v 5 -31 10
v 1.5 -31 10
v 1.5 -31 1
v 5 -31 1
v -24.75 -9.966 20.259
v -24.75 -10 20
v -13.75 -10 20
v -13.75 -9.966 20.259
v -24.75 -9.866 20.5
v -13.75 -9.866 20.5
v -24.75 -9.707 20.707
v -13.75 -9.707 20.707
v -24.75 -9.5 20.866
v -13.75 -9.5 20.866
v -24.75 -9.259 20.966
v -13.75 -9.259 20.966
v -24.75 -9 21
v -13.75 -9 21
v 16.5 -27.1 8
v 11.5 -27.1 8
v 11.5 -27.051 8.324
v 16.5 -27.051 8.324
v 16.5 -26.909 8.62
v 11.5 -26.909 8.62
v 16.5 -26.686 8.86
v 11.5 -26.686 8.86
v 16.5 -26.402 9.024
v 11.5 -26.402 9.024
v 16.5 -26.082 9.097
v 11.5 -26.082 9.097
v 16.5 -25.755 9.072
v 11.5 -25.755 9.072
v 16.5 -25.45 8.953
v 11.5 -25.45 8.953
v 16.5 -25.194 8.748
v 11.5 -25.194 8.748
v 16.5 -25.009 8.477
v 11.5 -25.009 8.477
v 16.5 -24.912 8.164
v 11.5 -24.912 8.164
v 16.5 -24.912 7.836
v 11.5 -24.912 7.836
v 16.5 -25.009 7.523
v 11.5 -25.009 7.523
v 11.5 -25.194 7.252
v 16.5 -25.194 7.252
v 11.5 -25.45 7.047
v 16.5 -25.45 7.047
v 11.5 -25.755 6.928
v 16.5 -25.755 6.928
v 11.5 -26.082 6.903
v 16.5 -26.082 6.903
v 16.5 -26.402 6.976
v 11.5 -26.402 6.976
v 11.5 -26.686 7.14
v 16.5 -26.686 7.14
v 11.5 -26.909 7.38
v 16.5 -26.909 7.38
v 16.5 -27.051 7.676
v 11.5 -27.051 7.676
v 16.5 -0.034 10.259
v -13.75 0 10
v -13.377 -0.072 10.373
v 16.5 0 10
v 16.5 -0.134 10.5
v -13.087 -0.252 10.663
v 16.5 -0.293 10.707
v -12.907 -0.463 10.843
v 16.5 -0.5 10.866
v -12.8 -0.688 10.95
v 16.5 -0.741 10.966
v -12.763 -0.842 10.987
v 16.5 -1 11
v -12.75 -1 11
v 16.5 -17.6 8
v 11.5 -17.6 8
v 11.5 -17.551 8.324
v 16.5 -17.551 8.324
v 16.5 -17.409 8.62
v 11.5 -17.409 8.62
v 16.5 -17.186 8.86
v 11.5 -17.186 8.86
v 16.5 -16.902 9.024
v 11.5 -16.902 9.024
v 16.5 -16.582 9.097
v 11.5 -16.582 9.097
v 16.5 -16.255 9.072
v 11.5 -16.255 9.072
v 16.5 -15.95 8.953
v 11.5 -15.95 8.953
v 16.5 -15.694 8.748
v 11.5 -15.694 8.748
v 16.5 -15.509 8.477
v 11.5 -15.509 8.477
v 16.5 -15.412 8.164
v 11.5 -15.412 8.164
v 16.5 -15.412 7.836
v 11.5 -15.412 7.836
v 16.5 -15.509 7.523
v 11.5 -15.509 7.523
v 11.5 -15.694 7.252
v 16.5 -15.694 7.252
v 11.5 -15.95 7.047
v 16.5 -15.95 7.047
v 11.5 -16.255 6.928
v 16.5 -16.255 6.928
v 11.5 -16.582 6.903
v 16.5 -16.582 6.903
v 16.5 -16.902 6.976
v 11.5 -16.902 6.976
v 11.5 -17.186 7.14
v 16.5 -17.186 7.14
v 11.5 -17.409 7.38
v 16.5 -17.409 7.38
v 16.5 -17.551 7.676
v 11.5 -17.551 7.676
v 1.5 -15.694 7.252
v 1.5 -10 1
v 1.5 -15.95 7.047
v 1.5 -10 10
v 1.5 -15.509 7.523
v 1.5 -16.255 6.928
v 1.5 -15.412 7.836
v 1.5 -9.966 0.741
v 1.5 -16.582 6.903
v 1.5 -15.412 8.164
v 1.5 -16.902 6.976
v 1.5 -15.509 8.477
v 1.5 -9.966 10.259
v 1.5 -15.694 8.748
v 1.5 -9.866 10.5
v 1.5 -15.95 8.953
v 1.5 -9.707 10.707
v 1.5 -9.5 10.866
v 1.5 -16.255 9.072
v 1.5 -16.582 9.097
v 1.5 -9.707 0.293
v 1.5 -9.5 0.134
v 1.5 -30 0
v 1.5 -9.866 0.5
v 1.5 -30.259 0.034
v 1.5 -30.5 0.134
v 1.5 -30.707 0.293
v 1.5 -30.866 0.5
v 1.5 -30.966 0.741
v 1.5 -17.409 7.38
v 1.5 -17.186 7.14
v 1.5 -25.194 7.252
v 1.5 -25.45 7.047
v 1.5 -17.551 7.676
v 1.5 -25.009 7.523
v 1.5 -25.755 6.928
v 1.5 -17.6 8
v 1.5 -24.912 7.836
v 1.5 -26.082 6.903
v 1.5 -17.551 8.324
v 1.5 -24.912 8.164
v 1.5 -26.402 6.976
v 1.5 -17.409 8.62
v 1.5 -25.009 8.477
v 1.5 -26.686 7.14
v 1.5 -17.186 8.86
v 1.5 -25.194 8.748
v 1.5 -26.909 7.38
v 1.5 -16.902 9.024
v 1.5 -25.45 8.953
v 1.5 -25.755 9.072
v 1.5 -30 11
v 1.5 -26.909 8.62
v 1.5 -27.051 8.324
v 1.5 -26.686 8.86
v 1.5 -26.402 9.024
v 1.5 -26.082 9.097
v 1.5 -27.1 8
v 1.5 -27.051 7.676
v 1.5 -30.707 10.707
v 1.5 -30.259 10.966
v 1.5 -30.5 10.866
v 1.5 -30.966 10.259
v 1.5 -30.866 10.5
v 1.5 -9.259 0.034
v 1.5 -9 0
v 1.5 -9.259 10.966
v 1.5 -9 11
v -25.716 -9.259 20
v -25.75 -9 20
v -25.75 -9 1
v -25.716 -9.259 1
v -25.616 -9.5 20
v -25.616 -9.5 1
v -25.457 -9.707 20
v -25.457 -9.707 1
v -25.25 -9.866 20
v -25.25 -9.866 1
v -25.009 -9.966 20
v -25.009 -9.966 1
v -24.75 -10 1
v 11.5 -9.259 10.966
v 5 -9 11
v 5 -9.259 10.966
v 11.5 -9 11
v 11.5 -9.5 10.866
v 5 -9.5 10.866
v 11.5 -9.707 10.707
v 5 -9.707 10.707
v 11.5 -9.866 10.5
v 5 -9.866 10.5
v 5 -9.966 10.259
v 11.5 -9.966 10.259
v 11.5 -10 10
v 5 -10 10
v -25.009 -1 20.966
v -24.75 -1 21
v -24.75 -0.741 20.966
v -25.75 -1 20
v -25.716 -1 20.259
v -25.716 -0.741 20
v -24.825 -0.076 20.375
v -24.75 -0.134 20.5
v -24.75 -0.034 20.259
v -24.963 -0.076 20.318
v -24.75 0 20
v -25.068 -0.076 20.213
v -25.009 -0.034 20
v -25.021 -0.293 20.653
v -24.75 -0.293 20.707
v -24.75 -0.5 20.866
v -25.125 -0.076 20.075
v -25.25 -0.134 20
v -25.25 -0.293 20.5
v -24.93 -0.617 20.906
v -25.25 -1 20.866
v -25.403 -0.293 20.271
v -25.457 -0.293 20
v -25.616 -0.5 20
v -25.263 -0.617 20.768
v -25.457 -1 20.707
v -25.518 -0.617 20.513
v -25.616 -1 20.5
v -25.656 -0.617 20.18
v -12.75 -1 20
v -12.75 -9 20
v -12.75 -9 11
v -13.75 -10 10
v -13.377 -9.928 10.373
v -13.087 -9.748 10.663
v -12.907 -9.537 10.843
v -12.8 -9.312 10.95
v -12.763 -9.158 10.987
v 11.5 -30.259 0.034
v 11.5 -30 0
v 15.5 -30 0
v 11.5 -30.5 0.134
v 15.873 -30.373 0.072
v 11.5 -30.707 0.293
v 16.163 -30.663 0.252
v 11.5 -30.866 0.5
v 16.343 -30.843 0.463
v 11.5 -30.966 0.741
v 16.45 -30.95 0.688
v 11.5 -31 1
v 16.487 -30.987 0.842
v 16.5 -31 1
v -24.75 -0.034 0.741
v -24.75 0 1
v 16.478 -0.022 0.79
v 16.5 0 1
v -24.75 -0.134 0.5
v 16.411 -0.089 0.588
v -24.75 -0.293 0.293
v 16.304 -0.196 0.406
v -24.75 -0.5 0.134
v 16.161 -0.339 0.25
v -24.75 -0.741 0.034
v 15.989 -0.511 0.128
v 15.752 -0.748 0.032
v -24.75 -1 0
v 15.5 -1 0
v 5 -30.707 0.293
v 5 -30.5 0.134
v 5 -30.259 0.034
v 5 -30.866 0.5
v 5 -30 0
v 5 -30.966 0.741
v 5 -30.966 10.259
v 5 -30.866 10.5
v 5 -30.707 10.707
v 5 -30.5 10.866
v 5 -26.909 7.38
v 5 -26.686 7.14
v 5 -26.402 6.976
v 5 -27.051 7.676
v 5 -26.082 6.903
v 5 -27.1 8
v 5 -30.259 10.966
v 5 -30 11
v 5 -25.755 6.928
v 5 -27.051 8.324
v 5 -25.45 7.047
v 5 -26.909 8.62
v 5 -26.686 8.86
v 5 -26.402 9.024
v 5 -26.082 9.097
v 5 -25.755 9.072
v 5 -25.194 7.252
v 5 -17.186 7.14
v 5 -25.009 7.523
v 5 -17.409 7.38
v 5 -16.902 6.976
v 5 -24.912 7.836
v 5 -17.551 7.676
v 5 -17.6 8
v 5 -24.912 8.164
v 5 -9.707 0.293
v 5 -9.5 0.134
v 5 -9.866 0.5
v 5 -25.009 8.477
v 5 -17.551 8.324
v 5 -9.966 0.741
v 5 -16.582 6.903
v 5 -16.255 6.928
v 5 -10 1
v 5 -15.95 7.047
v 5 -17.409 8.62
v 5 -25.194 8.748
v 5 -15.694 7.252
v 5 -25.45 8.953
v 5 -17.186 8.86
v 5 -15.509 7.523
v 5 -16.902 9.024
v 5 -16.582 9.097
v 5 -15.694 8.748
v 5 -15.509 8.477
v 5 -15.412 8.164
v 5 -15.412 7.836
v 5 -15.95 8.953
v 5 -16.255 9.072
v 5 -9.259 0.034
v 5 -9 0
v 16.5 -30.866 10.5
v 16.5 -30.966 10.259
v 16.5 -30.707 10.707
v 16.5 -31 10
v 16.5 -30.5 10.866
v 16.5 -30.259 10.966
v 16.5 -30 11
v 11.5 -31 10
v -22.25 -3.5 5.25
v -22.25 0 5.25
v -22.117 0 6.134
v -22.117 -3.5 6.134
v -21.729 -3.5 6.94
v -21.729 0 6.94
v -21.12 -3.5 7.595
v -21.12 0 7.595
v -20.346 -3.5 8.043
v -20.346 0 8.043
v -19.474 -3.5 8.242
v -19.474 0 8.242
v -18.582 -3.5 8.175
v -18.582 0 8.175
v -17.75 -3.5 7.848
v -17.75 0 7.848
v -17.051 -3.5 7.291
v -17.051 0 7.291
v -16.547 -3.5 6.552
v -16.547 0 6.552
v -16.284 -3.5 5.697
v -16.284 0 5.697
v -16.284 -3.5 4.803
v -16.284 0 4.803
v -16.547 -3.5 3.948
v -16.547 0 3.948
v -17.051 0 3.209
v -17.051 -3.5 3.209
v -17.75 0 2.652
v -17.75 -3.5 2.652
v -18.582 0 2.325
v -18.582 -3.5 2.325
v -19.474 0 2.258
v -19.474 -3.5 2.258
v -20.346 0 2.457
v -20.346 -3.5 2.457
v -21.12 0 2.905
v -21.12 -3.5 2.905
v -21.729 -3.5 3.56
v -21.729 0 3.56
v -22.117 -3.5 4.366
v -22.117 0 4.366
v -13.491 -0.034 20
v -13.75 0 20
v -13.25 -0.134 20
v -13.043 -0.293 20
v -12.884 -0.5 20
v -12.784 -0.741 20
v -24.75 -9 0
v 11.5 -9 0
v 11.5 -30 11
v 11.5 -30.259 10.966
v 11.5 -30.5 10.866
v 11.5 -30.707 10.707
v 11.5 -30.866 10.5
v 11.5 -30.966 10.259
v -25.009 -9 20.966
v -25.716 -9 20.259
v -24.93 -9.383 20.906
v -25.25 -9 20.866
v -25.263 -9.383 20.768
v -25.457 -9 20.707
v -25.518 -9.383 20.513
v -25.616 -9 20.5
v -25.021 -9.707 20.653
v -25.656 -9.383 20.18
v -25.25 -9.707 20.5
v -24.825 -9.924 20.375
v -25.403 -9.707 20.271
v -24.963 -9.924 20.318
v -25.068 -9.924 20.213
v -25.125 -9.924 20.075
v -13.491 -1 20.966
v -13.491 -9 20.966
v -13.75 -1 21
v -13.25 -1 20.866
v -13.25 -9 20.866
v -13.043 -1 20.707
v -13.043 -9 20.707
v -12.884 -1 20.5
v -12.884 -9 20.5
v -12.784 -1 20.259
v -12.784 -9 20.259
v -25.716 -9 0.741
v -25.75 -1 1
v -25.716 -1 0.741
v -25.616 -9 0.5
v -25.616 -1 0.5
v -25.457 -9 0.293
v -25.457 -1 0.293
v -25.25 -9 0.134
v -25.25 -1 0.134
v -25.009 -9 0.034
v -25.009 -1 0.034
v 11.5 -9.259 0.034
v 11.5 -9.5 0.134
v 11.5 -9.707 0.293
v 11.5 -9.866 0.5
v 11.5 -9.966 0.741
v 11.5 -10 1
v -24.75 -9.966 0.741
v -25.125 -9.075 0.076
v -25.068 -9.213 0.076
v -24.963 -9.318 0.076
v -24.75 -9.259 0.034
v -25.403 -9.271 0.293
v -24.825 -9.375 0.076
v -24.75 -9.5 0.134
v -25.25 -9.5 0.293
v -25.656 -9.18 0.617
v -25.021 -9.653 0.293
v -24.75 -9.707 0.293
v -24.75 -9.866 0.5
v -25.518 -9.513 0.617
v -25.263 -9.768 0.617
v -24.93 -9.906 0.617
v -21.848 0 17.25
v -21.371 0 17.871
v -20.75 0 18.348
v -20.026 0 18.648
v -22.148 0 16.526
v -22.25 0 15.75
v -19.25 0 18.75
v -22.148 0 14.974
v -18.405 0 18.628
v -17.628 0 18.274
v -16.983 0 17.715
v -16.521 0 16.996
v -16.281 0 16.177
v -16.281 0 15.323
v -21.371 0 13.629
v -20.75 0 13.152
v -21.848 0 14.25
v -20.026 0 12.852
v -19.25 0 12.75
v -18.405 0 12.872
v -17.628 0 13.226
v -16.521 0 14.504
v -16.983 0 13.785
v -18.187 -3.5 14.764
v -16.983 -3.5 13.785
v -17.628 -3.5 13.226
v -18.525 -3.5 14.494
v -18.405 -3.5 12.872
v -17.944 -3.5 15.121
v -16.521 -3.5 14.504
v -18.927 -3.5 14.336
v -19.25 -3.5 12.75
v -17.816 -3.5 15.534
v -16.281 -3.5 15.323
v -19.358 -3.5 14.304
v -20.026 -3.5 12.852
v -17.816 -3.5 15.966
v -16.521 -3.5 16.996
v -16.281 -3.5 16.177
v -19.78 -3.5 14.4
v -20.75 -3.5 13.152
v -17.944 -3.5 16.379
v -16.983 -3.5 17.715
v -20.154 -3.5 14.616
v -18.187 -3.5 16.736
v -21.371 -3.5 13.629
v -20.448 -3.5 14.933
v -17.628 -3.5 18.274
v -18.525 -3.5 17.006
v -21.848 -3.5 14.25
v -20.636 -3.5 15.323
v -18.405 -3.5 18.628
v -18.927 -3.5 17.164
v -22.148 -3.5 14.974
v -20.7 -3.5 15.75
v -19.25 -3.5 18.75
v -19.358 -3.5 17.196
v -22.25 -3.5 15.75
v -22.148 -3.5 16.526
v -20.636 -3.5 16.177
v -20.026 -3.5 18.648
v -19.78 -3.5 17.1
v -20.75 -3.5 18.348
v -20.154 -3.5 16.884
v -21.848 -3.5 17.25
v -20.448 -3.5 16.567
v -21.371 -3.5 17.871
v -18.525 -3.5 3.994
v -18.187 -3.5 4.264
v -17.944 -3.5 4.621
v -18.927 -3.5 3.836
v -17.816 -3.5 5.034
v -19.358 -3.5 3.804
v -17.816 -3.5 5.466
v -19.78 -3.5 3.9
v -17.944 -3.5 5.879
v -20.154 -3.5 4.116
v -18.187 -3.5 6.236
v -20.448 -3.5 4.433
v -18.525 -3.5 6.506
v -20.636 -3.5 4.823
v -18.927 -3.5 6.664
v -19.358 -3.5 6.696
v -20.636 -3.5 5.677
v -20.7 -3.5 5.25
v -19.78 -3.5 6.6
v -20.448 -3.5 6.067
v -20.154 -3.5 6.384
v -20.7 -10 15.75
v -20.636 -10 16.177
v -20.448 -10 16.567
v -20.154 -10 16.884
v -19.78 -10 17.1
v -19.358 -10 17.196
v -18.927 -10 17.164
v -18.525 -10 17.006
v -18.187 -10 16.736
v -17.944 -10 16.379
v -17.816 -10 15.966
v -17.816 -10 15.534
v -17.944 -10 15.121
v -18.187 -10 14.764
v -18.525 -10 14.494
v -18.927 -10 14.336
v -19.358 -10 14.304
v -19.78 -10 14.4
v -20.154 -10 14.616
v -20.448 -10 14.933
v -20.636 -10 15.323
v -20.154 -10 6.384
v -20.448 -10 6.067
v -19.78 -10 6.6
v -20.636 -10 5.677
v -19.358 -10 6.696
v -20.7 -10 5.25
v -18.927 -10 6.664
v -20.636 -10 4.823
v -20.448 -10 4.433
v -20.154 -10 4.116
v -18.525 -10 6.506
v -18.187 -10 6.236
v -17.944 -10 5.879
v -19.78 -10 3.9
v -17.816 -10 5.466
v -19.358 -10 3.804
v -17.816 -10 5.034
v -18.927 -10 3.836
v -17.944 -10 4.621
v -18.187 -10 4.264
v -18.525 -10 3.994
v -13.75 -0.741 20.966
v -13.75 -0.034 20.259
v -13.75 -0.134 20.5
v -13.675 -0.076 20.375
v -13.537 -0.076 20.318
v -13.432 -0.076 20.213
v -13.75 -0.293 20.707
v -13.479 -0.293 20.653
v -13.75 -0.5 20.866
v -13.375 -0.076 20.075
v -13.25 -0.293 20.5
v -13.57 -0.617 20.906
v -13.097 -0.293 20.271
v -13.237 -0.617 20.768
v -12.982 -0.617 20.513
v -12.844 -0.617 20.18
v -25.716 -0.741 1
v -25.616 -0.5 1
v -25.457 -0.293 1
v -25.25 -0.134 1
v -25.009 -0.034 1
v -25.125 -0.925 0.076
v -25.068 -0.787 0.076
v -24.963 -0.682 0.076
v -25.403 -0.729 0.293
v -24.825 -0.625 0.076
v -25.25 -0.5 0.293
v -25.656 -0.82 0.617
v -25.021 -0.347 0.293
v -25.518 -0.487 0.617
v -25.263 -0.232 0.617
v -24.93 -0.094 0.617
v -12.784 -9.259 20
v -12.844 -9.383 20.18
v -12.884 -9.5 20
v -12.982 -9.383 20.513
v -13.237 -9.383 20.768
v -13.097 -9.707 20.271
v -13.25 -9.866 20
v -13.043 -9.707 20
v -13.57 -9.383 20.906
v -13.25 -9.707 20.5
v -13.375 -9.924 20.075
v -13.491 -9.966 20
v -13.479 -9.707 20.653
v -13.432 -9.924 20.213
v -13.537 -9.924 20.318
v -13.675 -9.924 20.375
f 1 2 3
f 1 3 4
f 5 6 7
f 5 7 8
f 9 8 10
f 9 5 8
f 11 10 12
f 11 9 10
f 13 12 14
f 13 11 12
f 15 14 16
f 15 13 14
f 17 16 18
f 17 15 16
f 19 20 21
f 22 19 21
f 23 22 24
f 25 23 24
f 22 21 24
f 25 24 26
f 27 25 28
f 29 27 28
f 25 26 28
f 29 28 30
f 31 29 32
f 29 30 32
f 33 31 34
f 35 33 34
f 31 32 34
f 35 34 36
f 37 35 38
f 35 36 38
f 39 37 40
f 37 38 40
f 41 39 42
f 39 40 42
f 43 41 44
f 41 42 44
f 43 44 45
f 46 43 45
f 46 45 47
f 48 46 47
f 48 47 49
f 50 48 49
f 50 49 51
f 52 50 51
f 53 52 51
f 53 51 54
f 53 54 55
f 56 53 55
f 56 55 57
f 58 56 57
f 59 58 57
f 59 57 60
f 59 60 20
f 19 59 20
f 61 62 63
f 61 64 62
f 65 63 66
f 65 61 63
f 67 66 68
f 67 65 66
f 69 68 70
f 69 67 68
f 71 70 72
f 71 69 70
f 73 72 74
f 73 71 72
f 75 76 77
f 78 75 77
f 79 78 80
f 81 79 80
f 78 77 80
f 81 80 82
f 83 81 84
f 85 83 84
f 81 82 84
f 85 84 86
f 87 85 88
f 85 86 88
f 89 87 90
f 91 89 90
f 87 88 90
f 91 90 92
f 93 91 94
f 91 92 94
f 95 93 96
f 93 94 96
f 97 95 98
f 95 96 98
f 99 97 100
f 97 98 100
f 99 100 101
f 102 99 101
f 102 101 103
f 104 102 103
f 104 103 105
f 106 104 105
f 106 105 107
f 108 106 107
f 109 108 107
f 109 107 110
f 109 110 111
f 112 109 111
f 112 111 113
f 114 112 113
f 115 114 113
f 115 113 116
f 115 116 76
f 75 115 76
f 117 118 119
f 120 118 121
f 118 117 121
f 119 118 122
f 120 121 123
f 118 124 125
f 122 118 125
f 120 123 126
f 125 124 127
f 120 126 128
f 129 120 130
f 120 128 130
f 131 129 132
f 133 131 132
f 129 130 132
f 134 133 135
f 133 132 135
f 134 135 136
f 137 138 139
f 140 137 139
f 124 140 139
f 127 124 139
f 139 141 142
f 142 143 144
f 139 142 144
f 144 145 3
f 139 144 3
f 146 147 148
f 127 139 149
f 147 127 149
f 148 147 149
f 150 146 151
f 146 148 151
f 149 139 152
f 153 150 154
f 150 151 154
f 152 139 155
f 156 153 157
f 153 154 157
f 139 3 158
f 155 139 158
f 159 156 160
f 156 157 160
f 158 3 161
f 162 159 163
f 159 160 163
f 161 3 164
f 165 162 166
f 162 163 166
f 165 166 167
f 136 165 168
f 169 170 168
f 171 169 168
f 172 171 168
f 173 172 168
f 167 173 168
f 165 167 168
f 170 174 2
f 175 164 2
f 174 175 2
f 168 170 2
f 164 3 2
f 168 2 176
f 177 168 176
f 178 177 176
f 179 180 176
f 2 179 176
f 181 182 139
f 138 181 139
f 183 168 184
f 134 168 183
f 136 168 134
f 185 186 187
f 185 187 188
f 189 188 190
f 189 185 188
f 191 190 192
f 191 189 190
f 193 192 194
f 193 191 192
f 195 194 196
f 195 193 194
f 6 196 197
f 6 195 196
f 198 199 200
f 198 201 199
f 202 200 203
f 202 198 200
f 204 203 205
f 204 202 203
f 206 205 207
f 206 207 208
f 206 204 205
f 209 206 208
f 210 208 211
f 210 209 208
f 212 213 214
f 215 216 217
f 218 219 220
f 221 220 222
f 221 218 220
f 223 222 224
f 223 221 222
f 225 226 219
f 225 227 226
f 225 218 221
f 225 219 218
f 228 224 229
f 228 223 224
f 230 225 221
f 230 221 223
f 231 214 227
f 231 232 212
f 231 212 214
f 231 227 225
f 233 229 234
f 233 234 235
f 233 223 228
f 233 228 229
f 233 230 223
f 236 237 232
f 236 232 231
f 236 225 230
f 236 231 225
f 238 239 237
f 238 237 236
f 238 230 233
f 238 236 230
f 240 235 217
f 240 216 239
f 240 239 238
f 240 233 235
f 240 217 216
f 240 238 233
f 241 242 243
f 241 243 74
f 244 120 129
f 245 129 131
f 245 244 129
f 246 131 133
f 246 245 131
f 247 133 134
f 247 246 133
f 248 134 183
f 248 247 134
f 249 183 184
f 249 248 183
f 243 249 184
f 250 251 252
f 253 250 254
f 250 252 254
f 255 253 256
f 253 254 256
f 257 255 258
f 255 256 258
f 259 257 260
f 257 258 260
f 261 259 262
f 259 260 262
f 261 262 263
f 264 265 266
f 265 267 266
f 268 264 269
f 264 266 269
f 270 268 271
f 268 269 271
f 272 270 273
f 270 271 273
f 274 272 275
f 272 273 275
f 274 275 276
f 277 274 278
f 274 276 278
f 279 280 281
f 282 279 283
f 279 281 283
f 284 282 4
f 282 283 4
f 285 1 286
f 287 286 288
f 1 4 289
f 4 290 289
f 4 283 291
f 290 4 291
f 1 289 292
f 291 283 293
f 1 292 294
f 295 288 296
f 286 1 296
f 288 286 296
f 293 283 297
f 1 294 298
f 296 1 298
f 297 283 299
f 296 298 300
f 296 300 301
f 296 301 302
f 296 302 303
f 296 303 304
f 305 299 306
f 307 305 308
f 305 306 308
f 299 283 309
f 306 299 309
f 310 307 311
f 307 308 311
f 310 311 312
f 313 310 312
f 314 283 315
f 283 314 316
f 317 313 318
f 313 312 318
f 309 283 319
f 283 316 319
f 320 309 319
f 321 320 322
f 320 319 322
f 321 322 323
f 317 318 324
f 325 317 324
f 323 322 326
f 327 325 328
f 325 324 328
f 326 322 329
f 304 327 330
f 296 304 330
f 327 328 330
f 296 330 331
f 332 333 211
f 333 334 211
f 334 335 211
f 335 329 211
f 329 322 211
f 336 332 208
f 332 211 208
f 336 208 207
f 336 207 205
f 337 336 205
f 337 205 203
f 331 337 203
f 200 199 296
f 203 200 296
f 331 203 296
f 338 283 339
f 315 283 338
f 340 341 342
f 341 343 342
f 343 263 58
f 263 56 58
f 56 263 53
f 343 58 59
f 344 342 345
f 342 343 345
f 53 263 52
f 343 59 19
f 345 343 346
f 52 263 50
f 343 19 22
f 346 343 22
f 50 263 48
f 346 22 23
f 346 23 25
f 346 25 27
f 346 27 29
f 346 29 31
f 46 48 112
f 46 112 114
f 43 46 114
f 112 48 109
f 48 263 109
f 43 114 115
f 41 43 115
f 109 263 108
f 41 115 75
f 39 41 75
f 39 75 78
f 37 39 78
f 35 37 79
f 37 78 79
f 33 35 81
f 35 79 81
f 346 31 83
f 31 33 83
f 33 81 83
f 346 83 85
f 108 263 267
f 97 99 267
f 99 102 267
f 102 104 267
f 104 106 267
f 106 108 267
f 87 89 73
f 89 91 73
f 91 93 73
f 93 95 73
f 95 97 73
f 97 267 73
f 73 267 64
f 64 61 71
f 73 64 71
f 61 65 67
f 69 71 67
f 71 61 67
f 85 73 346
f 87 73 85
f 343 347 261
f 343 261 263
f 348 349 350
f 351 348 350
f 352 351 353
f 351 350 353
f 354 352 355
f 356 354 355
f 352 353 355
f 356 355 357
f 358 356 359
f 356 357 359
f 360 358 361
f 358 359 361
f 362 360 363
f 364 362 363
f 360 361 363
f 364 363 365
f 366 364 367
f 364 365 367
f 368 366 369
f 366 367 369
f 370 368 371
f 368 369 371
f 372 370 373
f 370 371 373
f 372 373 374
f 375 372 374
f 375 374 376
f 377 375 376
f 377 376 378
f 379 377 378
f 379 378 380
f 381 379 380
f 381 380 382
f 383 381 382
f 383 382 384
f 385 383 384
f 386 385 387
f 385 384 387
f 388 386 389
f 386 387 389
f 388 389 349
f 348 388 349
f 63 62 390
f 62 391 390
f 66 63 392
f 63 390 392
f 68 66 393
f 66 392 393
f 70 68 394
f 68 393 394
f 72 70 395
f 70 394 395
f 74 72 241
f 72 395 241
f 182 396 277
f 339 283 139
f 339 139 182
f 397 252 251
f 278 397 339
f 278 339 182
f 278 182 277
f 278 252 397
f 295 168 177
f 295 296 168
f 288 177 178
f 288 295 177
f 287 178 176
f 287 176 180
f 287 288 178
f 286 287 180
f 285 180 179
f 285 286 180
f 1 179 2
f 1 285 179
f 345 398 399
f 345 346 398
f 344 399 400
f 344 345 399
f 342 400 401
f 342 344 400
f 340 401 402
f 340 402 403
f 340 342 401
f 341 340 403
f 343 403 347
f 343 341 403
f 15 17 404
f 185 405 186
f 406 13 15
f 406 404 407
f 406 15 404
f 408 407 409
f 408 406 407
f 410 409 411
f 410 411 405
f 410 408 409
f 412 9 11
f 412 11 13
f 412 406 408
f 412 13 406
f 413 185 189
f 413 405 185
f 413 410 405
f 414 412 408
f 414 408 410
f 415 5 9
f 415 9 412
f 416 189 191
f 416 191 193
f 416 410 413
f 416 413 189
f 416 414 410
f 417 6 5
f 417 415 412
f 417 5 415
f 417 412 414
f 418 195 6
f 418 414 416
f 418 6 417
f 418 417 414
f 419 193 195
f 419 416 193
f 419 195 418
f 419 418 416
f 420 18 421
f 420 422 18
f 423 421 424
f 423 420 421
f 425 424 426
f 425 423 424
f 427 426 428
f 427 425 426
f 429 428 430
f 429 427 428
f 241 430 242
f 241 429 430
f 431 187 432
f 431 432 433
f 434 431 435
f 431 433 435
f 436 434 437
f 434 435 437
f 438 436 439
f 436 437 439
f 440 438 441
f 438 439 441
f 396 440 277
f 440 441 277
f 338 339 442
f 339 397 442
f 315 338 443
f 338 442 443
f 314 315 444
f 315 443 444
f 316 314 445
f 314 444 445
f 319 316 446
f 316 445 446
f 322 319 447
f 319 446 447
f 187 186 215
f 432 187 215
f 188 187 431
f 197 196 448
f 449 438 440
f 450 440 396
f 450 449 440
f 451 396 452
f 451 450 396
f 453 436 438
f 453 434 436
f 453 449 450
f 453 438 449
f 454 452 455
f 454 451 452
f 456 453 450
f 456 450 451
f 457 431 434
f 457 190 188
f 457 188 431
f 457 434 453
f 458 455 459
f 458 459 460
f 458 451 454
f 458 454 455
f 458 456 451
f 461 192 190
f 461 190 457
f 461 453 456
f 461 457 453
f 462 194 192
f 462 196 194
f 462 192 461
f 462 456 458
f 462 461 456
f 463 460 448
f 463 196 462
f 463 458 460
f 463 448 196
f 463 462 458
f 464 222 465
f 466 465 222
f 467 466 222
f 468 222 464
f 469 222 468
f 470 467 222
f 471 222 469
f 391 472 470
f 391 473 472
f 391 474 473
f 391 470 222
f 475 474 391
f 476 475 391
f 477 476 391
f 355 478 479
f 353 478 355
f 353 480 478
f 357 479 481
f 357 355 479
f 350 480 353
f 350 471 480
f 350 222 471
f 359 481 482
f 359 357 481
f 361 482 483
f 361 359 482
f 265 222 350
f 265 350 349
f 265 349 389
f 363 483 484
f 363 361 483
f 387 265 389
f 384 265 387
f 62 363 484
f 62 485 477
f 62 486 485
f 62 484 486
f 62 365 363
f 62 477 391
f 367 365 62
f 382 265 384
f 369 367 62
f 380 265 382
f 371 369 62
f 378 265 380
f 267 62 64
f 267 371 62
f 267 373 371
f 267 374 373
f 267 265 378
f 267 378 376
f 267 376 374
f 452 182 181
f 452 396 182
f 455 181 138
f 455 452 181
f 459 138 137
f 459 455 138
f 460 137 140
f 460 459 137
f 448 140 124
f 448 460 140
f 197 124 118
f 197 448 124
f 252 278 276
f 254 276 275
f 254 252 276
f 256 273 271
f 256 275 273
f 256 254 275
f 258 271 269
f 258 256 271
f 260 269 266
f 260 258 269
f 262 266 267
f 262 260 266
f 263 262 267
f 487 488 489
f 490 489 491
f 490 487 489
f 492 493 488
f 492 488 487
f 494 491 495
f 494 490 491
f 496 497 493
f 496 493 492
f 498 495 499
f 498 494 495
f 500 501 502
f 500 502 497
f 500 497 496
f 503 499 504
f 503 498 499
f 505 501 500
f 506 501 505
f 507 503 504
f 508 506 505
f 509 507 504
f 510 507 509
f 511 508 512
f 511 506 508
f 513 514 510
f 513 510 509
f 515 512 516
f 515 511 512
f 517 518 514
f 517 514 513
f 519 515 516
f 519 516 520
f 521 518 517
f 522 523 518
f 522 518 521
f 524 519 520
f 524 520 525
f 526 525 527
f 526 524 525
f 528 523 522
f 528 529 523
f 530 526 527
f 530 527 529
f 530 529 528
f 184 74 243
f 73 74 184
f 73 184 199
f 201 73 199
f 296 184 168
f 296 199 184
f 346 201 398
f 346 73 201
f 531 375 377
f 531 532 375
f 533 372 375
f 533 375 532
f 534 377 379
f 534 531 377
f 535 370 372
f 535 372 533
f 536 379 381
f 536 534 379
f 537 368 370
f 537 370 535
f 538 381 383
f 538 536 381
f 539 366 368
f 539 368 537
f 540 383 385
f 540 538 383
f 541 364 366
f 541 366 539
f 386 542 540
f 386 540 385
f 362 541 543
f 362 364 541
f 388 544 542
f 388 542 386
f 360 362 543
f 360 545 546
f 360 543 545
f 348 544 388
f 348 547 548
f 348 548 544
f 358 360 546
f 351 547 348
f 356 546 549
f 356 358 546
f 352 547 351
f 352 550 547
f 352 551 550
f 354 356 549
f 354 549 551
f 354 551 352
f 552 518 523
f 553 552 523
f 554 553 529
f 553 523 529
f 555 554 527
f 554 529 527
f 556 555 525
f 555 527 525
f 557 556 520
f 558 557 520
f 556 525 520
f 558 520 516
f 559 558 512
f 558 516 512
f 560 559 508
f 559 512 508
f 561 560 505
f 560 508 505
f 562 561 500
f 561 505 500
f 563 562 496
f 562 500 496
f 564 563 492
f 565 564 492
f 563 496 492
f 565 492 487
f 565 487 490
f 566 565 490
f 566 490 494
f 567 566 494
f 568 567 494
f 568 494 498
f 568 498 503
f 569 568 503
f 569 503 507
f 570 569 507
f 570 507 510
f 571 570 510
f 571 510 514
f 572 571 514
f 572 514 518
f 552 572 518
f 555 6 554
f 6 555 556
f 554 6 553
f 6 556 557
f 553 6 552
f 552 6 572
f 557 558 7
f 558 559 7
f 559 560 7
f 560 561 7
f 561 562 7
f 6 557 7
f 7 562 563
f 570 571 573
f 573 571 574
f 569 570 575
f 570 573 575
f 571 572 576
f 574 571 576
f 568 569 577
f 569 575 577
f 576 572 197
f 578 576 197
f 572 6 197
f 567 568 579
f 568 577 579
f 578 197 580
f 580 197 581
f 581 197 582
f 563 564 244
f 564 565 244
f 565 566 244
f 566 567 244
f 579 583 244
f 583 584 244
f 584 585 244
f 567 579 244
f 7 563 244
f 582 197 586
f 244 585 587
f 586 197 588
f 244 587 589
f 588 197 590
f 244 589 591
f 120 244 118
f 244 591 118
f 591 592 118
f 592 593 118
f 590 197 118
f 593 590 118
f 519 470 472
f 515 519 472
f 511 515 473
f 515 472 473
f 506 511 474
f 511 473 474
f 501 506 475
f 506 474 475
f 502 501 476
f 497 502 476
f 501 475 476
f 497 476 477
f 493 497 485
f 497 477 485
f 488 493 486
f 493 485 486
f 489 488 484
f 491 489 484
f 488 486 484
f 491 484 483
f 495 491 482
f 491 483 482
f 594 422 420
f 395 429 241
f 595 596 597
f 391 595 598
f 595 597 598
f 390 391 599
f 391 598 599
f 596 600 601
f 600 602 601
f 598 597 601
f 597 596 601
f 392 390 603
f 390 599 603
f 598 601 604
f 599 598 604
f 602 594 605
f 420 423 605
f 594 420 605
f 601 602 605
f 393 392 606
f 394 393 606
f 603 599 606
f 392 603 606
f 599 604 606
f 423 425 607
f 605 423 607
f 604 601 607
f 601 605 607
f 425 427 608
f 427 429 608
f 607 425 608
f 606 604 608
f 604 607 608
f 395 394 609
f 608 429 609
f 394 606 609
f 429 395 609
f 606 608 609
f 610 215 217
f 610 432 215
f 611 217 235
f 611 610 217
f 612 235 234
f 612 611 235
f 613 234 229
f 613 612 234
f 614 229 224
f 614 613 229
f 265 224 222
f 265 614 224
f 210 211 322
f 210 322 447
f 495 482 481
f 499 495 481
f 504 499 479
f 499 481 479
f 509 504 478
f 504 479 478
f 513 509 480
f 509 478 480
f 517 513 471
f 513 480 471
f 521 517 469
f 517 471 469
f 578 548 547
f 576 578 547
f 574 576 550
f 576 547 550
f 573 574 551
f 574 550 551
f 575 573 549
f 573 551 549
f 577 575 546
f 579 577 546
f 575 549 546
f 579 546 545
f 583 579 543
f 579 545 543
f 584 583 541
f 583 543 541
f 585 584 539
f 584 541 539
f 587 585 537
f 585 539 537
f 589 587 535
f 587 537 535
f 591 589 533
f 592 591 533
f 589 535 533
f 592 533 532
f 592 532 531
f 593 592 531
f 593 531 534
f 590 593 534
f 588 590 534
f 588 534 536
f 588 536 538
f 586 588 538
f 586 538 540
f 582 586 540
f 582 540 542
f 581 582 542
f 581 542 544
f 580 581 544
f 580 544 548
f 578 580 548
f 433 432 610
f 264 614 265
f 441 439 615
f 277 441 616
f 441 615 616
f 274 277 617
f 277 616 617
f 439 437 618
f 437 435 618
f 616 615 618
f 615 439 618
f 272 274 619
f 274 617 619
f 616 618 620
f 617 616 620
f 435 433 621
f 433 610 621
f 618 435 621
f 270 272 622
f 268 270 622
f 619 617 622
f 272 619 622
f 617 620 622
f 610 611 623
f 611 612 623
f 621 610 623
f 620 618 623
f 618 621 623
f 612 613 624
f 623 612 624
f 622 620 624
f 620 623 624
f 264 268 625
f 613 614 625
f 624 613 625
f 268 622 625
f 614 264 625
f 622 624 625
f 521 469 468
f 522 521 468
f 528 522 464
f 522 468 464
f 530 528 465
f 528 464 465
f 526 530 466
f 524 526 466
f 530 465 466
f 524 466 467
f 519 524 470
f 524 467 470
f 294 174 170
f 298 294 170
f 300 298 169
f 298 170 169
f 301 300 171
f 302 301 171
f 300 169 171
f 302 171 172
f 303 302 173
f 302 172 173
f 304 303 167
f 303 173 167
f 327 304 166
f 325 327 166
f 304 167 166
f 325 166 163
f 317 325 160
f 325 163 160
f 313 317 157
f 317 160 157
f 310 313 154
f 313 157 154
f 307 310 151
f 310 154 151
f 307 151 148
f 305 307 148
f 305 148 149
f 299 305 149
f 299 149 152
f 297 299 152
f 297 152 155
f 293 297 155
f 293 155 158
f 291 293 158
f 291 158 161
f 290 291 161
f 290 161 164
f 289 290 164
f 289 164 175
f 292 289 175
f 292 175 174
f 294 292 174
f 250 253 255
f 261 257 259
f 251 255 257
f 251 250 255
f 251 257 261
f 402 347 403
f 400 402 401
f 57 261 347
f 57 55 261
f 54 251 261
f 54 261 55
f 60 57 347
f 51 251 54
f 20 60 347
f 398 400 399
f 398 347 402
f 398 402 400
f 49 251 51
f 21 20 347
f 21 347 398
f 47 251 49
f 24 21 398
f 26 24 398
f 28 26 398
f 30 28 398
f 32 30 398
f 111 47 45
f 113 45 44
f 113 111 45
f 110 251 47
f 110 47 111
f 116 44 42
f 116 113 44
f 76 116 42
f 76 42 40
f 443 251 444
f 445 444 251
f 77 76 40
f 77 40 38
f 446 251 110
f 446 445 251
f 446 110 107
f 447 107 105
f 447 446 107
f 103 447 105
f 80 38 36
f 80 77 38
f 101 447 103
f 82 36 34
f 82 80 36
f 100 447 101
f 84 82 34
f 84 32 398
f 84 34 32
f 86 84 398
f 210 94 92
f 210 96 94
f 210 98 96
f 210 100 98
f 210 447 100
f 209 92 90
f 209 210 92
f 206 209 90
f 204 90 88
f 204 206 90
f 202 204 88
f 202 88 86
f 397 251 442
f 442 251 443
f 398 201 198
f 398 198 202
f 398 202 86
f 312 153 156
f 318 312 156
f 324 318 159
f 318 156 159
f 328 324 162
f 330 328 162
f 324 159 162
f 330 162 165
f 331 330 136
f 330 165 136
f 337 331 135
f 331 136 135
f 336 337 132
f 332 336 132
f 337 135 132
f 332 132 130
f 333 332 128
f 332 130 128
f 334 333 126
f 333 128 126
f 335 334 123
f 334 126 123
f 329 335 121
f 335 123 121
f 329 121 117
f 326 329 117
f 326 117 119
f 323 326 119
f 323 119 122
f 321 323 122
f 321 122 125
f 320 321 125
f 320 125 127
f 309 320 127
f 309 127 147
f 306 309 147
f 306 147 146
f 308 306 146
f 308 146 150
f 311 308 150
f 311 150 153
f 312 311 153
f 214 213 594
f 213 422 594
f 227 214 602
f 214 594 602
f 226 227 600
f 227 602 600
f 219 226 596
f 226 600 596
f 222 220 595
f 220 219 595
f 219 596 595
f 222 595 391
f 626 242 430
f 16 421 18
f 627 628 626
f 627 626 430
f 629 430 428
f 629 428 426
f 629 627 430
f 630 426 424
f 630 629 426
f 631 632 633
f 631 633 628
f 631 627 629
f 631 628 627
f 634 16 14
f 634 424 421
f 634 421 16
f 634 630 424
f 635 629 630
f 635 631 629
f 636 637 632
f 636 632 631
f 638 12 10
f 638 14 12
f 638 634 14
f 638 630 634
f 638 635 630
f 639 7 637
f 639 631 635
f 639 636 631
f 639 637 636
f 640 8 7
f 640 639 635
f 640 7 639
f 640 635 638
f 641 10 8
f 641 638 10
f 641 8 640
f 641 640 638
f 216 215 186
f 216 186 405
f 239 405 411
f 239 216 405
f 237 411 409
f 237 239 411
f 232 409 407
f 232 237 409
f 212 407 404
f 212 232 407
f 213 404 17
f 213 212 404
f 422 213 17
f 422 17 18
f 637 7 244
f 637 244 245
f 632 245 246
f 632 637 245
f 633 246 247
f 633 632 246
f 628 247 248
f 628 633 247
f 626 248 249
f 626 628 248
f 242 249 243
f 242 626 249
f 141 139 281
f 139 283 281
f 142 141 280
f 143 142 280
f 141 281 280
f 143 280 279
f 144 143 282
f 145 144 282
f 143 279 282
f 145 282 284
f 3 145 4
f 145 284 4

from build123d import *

# Parameters (mm, degrees)
F0_W          = 16.5
F0_H          = 11
F1_DEPTH      = 10
F2_W          = 5
F2_H          = 11
F3_DEPTH      = 21
F4_R          = 1.1
F5_DEPTH      = 25
F6_W          = 1.5
F6_H          = 11
F7_DEPTH      = 21
F8_DEPTH      = 25.75
F9_W          = 13
F9_H          = 10
F10_DEPTH     = 10
F11_R         = 3
F12_DEPTH     = 3.5
F13_R         = 1.45
F14_DEPTH     = 25
F15_R         = 1
F16_T1_DEPTH  = 11
F16_S5_W      = 1
F16_S5_H      = 1
F16_T6_DEPTH  = 1
F16_S11_W     = 1
F16_S11_H     = 1
F16_T12_DEPTH = 1


# Not quite as in the source:
# - a fillet or chamfer that OpenCascade refuses, or shapes differently, is made with other operations: its cross-section is extruded or revolved along the edge and cut away or added


with BuildPart() as f1:
    # F0 (on Front) → F1 (new body)
    with BuildSketch(Plane.XZ):
        with Locations((8.25, 5.5)):
            Rectangle(F0_W, F0_H)
    extrude(amount=F1_DEPTH)

    # F2 (on face) → F3 (join)
    with BuildSketch(Plane.XZ.offset(10)):
        with Locations((14, 5.5)):
            Rectangle(F2_W, F2_H)
        with Locations((2.5, 5.5)):
            Rectangle(F2_W, F2_H)
    extrude(amount=F3_DEPTH)

    # F4 (on face) → F5 (cut)
    with BuildSketch(Plane(origin=(0, 0, 0), x_dir=(0, -1, 0), z_dir=(-1, 0, 0))):
        with BuildLine():
            ThreePointArc((24.9, 8), (26, 6.9), (27.1, 8))
            Line((27.1, 8), (26, 8))
            Line((26, 8), (24.9, 8))
        make_face()
        with BuildLine():
            Line((26, 8), (27.1, 8))
            ThreePointArc((27.1, 8), (26, 9.1), (24.9, 8))
            Line((24.9, 8), (26, 8))
        make_face()
        with Locations((16.5, 8)):
            Circle(F4_R)
    extrude(amount=-F5_DEPTH, mode=Mode.SUBTRACT)

    # F6 (on face) → F7 (cut)
    with BuildSketch(Plane.XZ.offset(31)):
        with Locations((0.75, 5.5)):
            Rectangle(F6_W, F6_H)
    extrude(amount=-F7_DEPTH, mode=Mode.SUBTRACT)

    # F8 (add): a face of the model
    f8_faces = [f1.faces().sort_by_distance(p)[0] for p in [
        (0, -5, 5.5),
    ]]
    extrude(f8_faces, amount=F8_DEPTH)

    # F9 (on face) → F10 (join)
    with BuildSketch(Plane.XY.offset(11)):
        with Locations((-19.25, -5)):
            Rectangle(F9_W, F9_H)
    extrude(amount=F10_DEPTH)

    # F11 (on face) → F12 (cut)
    with BuildSketch(Plane(origin=(0, 0, 0), x_dir=(-1, 0, 0), z_dir=(0, 1, 0))):
        with BuildLine():
            ThreePointArc((22.25, 15.75), (21.3713203436, 17.8713203436), (19.25, 18.75))
            Line((19.25, 18.75), (19.25, 12.75))
            ThreePointArc((19.25, 12.75), (21.3713203436, 13.6286796564), (22.25, 15.75))
        make_face()
        with BuildLine():
            Line((19.25, 12.75), (19.25, 18.75))
            ThreePointArc((19.25, 18.75), (16.25, 15.75), (19.25, 12.75))
        make_face()
        with Locations((19.25, 5.25)):
            Circle(F11_R)
    extrude(amount=-F12_DEPTH, mode=Mode.SUBTRACT)

    # F13 (on face) → F14 (cut)
    with BuildSketch(Plane(origin=(0, 0, 0), x_dir=(-1, 0, 0), z_dir=(0, 1, 0))):
        with Locations((19.25, 15.75)):
            Circle(F13_R)
        with Locations((19.25, 5.25)):
            Circle(F13_R)
    extrude(amount=-F14_DEPTH, mode=Mode.SUBTRACT)

    # F15
    f15_edges = [f1.edges().sort_by_distance(p)[0] for p in [
        (-12.75, -5, 21),
        (-25.75, -5, 21),
        (-19.25, 0, 21),
        (-25.75, 0, 10.5),
        (-25.75, -10, 10.5),
        (-25.75, -5, 0),
        (-4.625, 0, 0),
        (-12.125, -10, 0),
        (-12.75, 0, 16),
        (-12.75, -10, 16),
        (1.875, 0, 11),
        (-5.625, -10, 11),
        (8.25, -10, 11),
        (8.25, -10, 0),
        (3.25, -31, 11),
        (14, -31, 11),
        (14, -31, 0),
        (16.5, -15.5, 0),
        (3.25, -31, 0),
    ]]
    fillet(f15_edges, radius=F15_R)

    # F16: fillet of radius 1 on 1 edges, made by hand

    # F16_s2 → F16_t1 (cut)
    with BuildSketch(Plane.YZ.offset(-24.75)):
        with BuildLine():
            ThreePointArc((-10, 20), (-9.7071067812, 20.7071067812), (-9, 21))
            Line((-9, 21), (-10, 21))
            Line((-10, 21), (-10, 20))
        make_face()
    extrude(amount=F16_T1_DEPTH, mode=Mode.SUBTRACT)


with BuildPart() as f16_tool4:
    # F16_s5 → F16_t6 (new body)
    with BuildSketch(Plane.XZ.offset(9)):
        with Locations((-25.25, 20.5)):
            Rectangle(F16_S5_W, F16_S5_H)
    extrude(amount=F16_T6_DEPTH)

    # F16_s7 → F16_t8 (revolve, cut)
    with BuildSketch(Plane(origin=(-24.75, -9, 20), x_dir=(0.7071067812, 0, -0.7071067812), z_dir=(-0.7071067812, 0, -0.7071067812))):
        with BuildLine():
            ThreePointArc((0, -1), (1, 0), (0, 1))
            Line((0, 1), (0, -1))
        make_face()
    revolve(axis=Axis((-24.75, -9, 20), (0, -1, 0)), mode=Mode.SUBTRACT)


with BuildPart() as f1_1:
    add(f1.part)

    # F16_t3: cut F16_tool4
    add(f16_tool4.part, mode=Mode.SUBTRACT)


with BuildPart() as f16_tool10:
    # F16_s11 → F16_t12 (new body)
    with BuildSketch(Plane.XZ.offset(9)):
        with Locations((-13.25, 20.5)):
            Rectangle(F16_S11_W, F16_S11_H)
    extrude(amount=F16_T12_DEPTH)

    # F16_s13 → F16_t14 (revolve, cut)
    with BuildSketch(Plane(origin=(-13.75, -9, 20), x_dir=(-0.7071067812, 0, -0.7071067812), z_dir=(-0.7071067812, 0, 0.7071067812))):
        with BuildLine():
            ThreePointArc((0, -1), (1, 0), (0, 1))
            Line((0, 1), (0, -1))
        make_face()
    revolve(axis=Axis((-13.75, -9, 20), (0, -1, 0)), mode=Mode.SUBTRACT)


with BuildPart() as f1_2:
    add(f1_1.part)

    # F16_t9: cut F16_tool10
    add(f16_tool10.part, mode=Mode.SUBTRACT)


solid = f1_2.part
